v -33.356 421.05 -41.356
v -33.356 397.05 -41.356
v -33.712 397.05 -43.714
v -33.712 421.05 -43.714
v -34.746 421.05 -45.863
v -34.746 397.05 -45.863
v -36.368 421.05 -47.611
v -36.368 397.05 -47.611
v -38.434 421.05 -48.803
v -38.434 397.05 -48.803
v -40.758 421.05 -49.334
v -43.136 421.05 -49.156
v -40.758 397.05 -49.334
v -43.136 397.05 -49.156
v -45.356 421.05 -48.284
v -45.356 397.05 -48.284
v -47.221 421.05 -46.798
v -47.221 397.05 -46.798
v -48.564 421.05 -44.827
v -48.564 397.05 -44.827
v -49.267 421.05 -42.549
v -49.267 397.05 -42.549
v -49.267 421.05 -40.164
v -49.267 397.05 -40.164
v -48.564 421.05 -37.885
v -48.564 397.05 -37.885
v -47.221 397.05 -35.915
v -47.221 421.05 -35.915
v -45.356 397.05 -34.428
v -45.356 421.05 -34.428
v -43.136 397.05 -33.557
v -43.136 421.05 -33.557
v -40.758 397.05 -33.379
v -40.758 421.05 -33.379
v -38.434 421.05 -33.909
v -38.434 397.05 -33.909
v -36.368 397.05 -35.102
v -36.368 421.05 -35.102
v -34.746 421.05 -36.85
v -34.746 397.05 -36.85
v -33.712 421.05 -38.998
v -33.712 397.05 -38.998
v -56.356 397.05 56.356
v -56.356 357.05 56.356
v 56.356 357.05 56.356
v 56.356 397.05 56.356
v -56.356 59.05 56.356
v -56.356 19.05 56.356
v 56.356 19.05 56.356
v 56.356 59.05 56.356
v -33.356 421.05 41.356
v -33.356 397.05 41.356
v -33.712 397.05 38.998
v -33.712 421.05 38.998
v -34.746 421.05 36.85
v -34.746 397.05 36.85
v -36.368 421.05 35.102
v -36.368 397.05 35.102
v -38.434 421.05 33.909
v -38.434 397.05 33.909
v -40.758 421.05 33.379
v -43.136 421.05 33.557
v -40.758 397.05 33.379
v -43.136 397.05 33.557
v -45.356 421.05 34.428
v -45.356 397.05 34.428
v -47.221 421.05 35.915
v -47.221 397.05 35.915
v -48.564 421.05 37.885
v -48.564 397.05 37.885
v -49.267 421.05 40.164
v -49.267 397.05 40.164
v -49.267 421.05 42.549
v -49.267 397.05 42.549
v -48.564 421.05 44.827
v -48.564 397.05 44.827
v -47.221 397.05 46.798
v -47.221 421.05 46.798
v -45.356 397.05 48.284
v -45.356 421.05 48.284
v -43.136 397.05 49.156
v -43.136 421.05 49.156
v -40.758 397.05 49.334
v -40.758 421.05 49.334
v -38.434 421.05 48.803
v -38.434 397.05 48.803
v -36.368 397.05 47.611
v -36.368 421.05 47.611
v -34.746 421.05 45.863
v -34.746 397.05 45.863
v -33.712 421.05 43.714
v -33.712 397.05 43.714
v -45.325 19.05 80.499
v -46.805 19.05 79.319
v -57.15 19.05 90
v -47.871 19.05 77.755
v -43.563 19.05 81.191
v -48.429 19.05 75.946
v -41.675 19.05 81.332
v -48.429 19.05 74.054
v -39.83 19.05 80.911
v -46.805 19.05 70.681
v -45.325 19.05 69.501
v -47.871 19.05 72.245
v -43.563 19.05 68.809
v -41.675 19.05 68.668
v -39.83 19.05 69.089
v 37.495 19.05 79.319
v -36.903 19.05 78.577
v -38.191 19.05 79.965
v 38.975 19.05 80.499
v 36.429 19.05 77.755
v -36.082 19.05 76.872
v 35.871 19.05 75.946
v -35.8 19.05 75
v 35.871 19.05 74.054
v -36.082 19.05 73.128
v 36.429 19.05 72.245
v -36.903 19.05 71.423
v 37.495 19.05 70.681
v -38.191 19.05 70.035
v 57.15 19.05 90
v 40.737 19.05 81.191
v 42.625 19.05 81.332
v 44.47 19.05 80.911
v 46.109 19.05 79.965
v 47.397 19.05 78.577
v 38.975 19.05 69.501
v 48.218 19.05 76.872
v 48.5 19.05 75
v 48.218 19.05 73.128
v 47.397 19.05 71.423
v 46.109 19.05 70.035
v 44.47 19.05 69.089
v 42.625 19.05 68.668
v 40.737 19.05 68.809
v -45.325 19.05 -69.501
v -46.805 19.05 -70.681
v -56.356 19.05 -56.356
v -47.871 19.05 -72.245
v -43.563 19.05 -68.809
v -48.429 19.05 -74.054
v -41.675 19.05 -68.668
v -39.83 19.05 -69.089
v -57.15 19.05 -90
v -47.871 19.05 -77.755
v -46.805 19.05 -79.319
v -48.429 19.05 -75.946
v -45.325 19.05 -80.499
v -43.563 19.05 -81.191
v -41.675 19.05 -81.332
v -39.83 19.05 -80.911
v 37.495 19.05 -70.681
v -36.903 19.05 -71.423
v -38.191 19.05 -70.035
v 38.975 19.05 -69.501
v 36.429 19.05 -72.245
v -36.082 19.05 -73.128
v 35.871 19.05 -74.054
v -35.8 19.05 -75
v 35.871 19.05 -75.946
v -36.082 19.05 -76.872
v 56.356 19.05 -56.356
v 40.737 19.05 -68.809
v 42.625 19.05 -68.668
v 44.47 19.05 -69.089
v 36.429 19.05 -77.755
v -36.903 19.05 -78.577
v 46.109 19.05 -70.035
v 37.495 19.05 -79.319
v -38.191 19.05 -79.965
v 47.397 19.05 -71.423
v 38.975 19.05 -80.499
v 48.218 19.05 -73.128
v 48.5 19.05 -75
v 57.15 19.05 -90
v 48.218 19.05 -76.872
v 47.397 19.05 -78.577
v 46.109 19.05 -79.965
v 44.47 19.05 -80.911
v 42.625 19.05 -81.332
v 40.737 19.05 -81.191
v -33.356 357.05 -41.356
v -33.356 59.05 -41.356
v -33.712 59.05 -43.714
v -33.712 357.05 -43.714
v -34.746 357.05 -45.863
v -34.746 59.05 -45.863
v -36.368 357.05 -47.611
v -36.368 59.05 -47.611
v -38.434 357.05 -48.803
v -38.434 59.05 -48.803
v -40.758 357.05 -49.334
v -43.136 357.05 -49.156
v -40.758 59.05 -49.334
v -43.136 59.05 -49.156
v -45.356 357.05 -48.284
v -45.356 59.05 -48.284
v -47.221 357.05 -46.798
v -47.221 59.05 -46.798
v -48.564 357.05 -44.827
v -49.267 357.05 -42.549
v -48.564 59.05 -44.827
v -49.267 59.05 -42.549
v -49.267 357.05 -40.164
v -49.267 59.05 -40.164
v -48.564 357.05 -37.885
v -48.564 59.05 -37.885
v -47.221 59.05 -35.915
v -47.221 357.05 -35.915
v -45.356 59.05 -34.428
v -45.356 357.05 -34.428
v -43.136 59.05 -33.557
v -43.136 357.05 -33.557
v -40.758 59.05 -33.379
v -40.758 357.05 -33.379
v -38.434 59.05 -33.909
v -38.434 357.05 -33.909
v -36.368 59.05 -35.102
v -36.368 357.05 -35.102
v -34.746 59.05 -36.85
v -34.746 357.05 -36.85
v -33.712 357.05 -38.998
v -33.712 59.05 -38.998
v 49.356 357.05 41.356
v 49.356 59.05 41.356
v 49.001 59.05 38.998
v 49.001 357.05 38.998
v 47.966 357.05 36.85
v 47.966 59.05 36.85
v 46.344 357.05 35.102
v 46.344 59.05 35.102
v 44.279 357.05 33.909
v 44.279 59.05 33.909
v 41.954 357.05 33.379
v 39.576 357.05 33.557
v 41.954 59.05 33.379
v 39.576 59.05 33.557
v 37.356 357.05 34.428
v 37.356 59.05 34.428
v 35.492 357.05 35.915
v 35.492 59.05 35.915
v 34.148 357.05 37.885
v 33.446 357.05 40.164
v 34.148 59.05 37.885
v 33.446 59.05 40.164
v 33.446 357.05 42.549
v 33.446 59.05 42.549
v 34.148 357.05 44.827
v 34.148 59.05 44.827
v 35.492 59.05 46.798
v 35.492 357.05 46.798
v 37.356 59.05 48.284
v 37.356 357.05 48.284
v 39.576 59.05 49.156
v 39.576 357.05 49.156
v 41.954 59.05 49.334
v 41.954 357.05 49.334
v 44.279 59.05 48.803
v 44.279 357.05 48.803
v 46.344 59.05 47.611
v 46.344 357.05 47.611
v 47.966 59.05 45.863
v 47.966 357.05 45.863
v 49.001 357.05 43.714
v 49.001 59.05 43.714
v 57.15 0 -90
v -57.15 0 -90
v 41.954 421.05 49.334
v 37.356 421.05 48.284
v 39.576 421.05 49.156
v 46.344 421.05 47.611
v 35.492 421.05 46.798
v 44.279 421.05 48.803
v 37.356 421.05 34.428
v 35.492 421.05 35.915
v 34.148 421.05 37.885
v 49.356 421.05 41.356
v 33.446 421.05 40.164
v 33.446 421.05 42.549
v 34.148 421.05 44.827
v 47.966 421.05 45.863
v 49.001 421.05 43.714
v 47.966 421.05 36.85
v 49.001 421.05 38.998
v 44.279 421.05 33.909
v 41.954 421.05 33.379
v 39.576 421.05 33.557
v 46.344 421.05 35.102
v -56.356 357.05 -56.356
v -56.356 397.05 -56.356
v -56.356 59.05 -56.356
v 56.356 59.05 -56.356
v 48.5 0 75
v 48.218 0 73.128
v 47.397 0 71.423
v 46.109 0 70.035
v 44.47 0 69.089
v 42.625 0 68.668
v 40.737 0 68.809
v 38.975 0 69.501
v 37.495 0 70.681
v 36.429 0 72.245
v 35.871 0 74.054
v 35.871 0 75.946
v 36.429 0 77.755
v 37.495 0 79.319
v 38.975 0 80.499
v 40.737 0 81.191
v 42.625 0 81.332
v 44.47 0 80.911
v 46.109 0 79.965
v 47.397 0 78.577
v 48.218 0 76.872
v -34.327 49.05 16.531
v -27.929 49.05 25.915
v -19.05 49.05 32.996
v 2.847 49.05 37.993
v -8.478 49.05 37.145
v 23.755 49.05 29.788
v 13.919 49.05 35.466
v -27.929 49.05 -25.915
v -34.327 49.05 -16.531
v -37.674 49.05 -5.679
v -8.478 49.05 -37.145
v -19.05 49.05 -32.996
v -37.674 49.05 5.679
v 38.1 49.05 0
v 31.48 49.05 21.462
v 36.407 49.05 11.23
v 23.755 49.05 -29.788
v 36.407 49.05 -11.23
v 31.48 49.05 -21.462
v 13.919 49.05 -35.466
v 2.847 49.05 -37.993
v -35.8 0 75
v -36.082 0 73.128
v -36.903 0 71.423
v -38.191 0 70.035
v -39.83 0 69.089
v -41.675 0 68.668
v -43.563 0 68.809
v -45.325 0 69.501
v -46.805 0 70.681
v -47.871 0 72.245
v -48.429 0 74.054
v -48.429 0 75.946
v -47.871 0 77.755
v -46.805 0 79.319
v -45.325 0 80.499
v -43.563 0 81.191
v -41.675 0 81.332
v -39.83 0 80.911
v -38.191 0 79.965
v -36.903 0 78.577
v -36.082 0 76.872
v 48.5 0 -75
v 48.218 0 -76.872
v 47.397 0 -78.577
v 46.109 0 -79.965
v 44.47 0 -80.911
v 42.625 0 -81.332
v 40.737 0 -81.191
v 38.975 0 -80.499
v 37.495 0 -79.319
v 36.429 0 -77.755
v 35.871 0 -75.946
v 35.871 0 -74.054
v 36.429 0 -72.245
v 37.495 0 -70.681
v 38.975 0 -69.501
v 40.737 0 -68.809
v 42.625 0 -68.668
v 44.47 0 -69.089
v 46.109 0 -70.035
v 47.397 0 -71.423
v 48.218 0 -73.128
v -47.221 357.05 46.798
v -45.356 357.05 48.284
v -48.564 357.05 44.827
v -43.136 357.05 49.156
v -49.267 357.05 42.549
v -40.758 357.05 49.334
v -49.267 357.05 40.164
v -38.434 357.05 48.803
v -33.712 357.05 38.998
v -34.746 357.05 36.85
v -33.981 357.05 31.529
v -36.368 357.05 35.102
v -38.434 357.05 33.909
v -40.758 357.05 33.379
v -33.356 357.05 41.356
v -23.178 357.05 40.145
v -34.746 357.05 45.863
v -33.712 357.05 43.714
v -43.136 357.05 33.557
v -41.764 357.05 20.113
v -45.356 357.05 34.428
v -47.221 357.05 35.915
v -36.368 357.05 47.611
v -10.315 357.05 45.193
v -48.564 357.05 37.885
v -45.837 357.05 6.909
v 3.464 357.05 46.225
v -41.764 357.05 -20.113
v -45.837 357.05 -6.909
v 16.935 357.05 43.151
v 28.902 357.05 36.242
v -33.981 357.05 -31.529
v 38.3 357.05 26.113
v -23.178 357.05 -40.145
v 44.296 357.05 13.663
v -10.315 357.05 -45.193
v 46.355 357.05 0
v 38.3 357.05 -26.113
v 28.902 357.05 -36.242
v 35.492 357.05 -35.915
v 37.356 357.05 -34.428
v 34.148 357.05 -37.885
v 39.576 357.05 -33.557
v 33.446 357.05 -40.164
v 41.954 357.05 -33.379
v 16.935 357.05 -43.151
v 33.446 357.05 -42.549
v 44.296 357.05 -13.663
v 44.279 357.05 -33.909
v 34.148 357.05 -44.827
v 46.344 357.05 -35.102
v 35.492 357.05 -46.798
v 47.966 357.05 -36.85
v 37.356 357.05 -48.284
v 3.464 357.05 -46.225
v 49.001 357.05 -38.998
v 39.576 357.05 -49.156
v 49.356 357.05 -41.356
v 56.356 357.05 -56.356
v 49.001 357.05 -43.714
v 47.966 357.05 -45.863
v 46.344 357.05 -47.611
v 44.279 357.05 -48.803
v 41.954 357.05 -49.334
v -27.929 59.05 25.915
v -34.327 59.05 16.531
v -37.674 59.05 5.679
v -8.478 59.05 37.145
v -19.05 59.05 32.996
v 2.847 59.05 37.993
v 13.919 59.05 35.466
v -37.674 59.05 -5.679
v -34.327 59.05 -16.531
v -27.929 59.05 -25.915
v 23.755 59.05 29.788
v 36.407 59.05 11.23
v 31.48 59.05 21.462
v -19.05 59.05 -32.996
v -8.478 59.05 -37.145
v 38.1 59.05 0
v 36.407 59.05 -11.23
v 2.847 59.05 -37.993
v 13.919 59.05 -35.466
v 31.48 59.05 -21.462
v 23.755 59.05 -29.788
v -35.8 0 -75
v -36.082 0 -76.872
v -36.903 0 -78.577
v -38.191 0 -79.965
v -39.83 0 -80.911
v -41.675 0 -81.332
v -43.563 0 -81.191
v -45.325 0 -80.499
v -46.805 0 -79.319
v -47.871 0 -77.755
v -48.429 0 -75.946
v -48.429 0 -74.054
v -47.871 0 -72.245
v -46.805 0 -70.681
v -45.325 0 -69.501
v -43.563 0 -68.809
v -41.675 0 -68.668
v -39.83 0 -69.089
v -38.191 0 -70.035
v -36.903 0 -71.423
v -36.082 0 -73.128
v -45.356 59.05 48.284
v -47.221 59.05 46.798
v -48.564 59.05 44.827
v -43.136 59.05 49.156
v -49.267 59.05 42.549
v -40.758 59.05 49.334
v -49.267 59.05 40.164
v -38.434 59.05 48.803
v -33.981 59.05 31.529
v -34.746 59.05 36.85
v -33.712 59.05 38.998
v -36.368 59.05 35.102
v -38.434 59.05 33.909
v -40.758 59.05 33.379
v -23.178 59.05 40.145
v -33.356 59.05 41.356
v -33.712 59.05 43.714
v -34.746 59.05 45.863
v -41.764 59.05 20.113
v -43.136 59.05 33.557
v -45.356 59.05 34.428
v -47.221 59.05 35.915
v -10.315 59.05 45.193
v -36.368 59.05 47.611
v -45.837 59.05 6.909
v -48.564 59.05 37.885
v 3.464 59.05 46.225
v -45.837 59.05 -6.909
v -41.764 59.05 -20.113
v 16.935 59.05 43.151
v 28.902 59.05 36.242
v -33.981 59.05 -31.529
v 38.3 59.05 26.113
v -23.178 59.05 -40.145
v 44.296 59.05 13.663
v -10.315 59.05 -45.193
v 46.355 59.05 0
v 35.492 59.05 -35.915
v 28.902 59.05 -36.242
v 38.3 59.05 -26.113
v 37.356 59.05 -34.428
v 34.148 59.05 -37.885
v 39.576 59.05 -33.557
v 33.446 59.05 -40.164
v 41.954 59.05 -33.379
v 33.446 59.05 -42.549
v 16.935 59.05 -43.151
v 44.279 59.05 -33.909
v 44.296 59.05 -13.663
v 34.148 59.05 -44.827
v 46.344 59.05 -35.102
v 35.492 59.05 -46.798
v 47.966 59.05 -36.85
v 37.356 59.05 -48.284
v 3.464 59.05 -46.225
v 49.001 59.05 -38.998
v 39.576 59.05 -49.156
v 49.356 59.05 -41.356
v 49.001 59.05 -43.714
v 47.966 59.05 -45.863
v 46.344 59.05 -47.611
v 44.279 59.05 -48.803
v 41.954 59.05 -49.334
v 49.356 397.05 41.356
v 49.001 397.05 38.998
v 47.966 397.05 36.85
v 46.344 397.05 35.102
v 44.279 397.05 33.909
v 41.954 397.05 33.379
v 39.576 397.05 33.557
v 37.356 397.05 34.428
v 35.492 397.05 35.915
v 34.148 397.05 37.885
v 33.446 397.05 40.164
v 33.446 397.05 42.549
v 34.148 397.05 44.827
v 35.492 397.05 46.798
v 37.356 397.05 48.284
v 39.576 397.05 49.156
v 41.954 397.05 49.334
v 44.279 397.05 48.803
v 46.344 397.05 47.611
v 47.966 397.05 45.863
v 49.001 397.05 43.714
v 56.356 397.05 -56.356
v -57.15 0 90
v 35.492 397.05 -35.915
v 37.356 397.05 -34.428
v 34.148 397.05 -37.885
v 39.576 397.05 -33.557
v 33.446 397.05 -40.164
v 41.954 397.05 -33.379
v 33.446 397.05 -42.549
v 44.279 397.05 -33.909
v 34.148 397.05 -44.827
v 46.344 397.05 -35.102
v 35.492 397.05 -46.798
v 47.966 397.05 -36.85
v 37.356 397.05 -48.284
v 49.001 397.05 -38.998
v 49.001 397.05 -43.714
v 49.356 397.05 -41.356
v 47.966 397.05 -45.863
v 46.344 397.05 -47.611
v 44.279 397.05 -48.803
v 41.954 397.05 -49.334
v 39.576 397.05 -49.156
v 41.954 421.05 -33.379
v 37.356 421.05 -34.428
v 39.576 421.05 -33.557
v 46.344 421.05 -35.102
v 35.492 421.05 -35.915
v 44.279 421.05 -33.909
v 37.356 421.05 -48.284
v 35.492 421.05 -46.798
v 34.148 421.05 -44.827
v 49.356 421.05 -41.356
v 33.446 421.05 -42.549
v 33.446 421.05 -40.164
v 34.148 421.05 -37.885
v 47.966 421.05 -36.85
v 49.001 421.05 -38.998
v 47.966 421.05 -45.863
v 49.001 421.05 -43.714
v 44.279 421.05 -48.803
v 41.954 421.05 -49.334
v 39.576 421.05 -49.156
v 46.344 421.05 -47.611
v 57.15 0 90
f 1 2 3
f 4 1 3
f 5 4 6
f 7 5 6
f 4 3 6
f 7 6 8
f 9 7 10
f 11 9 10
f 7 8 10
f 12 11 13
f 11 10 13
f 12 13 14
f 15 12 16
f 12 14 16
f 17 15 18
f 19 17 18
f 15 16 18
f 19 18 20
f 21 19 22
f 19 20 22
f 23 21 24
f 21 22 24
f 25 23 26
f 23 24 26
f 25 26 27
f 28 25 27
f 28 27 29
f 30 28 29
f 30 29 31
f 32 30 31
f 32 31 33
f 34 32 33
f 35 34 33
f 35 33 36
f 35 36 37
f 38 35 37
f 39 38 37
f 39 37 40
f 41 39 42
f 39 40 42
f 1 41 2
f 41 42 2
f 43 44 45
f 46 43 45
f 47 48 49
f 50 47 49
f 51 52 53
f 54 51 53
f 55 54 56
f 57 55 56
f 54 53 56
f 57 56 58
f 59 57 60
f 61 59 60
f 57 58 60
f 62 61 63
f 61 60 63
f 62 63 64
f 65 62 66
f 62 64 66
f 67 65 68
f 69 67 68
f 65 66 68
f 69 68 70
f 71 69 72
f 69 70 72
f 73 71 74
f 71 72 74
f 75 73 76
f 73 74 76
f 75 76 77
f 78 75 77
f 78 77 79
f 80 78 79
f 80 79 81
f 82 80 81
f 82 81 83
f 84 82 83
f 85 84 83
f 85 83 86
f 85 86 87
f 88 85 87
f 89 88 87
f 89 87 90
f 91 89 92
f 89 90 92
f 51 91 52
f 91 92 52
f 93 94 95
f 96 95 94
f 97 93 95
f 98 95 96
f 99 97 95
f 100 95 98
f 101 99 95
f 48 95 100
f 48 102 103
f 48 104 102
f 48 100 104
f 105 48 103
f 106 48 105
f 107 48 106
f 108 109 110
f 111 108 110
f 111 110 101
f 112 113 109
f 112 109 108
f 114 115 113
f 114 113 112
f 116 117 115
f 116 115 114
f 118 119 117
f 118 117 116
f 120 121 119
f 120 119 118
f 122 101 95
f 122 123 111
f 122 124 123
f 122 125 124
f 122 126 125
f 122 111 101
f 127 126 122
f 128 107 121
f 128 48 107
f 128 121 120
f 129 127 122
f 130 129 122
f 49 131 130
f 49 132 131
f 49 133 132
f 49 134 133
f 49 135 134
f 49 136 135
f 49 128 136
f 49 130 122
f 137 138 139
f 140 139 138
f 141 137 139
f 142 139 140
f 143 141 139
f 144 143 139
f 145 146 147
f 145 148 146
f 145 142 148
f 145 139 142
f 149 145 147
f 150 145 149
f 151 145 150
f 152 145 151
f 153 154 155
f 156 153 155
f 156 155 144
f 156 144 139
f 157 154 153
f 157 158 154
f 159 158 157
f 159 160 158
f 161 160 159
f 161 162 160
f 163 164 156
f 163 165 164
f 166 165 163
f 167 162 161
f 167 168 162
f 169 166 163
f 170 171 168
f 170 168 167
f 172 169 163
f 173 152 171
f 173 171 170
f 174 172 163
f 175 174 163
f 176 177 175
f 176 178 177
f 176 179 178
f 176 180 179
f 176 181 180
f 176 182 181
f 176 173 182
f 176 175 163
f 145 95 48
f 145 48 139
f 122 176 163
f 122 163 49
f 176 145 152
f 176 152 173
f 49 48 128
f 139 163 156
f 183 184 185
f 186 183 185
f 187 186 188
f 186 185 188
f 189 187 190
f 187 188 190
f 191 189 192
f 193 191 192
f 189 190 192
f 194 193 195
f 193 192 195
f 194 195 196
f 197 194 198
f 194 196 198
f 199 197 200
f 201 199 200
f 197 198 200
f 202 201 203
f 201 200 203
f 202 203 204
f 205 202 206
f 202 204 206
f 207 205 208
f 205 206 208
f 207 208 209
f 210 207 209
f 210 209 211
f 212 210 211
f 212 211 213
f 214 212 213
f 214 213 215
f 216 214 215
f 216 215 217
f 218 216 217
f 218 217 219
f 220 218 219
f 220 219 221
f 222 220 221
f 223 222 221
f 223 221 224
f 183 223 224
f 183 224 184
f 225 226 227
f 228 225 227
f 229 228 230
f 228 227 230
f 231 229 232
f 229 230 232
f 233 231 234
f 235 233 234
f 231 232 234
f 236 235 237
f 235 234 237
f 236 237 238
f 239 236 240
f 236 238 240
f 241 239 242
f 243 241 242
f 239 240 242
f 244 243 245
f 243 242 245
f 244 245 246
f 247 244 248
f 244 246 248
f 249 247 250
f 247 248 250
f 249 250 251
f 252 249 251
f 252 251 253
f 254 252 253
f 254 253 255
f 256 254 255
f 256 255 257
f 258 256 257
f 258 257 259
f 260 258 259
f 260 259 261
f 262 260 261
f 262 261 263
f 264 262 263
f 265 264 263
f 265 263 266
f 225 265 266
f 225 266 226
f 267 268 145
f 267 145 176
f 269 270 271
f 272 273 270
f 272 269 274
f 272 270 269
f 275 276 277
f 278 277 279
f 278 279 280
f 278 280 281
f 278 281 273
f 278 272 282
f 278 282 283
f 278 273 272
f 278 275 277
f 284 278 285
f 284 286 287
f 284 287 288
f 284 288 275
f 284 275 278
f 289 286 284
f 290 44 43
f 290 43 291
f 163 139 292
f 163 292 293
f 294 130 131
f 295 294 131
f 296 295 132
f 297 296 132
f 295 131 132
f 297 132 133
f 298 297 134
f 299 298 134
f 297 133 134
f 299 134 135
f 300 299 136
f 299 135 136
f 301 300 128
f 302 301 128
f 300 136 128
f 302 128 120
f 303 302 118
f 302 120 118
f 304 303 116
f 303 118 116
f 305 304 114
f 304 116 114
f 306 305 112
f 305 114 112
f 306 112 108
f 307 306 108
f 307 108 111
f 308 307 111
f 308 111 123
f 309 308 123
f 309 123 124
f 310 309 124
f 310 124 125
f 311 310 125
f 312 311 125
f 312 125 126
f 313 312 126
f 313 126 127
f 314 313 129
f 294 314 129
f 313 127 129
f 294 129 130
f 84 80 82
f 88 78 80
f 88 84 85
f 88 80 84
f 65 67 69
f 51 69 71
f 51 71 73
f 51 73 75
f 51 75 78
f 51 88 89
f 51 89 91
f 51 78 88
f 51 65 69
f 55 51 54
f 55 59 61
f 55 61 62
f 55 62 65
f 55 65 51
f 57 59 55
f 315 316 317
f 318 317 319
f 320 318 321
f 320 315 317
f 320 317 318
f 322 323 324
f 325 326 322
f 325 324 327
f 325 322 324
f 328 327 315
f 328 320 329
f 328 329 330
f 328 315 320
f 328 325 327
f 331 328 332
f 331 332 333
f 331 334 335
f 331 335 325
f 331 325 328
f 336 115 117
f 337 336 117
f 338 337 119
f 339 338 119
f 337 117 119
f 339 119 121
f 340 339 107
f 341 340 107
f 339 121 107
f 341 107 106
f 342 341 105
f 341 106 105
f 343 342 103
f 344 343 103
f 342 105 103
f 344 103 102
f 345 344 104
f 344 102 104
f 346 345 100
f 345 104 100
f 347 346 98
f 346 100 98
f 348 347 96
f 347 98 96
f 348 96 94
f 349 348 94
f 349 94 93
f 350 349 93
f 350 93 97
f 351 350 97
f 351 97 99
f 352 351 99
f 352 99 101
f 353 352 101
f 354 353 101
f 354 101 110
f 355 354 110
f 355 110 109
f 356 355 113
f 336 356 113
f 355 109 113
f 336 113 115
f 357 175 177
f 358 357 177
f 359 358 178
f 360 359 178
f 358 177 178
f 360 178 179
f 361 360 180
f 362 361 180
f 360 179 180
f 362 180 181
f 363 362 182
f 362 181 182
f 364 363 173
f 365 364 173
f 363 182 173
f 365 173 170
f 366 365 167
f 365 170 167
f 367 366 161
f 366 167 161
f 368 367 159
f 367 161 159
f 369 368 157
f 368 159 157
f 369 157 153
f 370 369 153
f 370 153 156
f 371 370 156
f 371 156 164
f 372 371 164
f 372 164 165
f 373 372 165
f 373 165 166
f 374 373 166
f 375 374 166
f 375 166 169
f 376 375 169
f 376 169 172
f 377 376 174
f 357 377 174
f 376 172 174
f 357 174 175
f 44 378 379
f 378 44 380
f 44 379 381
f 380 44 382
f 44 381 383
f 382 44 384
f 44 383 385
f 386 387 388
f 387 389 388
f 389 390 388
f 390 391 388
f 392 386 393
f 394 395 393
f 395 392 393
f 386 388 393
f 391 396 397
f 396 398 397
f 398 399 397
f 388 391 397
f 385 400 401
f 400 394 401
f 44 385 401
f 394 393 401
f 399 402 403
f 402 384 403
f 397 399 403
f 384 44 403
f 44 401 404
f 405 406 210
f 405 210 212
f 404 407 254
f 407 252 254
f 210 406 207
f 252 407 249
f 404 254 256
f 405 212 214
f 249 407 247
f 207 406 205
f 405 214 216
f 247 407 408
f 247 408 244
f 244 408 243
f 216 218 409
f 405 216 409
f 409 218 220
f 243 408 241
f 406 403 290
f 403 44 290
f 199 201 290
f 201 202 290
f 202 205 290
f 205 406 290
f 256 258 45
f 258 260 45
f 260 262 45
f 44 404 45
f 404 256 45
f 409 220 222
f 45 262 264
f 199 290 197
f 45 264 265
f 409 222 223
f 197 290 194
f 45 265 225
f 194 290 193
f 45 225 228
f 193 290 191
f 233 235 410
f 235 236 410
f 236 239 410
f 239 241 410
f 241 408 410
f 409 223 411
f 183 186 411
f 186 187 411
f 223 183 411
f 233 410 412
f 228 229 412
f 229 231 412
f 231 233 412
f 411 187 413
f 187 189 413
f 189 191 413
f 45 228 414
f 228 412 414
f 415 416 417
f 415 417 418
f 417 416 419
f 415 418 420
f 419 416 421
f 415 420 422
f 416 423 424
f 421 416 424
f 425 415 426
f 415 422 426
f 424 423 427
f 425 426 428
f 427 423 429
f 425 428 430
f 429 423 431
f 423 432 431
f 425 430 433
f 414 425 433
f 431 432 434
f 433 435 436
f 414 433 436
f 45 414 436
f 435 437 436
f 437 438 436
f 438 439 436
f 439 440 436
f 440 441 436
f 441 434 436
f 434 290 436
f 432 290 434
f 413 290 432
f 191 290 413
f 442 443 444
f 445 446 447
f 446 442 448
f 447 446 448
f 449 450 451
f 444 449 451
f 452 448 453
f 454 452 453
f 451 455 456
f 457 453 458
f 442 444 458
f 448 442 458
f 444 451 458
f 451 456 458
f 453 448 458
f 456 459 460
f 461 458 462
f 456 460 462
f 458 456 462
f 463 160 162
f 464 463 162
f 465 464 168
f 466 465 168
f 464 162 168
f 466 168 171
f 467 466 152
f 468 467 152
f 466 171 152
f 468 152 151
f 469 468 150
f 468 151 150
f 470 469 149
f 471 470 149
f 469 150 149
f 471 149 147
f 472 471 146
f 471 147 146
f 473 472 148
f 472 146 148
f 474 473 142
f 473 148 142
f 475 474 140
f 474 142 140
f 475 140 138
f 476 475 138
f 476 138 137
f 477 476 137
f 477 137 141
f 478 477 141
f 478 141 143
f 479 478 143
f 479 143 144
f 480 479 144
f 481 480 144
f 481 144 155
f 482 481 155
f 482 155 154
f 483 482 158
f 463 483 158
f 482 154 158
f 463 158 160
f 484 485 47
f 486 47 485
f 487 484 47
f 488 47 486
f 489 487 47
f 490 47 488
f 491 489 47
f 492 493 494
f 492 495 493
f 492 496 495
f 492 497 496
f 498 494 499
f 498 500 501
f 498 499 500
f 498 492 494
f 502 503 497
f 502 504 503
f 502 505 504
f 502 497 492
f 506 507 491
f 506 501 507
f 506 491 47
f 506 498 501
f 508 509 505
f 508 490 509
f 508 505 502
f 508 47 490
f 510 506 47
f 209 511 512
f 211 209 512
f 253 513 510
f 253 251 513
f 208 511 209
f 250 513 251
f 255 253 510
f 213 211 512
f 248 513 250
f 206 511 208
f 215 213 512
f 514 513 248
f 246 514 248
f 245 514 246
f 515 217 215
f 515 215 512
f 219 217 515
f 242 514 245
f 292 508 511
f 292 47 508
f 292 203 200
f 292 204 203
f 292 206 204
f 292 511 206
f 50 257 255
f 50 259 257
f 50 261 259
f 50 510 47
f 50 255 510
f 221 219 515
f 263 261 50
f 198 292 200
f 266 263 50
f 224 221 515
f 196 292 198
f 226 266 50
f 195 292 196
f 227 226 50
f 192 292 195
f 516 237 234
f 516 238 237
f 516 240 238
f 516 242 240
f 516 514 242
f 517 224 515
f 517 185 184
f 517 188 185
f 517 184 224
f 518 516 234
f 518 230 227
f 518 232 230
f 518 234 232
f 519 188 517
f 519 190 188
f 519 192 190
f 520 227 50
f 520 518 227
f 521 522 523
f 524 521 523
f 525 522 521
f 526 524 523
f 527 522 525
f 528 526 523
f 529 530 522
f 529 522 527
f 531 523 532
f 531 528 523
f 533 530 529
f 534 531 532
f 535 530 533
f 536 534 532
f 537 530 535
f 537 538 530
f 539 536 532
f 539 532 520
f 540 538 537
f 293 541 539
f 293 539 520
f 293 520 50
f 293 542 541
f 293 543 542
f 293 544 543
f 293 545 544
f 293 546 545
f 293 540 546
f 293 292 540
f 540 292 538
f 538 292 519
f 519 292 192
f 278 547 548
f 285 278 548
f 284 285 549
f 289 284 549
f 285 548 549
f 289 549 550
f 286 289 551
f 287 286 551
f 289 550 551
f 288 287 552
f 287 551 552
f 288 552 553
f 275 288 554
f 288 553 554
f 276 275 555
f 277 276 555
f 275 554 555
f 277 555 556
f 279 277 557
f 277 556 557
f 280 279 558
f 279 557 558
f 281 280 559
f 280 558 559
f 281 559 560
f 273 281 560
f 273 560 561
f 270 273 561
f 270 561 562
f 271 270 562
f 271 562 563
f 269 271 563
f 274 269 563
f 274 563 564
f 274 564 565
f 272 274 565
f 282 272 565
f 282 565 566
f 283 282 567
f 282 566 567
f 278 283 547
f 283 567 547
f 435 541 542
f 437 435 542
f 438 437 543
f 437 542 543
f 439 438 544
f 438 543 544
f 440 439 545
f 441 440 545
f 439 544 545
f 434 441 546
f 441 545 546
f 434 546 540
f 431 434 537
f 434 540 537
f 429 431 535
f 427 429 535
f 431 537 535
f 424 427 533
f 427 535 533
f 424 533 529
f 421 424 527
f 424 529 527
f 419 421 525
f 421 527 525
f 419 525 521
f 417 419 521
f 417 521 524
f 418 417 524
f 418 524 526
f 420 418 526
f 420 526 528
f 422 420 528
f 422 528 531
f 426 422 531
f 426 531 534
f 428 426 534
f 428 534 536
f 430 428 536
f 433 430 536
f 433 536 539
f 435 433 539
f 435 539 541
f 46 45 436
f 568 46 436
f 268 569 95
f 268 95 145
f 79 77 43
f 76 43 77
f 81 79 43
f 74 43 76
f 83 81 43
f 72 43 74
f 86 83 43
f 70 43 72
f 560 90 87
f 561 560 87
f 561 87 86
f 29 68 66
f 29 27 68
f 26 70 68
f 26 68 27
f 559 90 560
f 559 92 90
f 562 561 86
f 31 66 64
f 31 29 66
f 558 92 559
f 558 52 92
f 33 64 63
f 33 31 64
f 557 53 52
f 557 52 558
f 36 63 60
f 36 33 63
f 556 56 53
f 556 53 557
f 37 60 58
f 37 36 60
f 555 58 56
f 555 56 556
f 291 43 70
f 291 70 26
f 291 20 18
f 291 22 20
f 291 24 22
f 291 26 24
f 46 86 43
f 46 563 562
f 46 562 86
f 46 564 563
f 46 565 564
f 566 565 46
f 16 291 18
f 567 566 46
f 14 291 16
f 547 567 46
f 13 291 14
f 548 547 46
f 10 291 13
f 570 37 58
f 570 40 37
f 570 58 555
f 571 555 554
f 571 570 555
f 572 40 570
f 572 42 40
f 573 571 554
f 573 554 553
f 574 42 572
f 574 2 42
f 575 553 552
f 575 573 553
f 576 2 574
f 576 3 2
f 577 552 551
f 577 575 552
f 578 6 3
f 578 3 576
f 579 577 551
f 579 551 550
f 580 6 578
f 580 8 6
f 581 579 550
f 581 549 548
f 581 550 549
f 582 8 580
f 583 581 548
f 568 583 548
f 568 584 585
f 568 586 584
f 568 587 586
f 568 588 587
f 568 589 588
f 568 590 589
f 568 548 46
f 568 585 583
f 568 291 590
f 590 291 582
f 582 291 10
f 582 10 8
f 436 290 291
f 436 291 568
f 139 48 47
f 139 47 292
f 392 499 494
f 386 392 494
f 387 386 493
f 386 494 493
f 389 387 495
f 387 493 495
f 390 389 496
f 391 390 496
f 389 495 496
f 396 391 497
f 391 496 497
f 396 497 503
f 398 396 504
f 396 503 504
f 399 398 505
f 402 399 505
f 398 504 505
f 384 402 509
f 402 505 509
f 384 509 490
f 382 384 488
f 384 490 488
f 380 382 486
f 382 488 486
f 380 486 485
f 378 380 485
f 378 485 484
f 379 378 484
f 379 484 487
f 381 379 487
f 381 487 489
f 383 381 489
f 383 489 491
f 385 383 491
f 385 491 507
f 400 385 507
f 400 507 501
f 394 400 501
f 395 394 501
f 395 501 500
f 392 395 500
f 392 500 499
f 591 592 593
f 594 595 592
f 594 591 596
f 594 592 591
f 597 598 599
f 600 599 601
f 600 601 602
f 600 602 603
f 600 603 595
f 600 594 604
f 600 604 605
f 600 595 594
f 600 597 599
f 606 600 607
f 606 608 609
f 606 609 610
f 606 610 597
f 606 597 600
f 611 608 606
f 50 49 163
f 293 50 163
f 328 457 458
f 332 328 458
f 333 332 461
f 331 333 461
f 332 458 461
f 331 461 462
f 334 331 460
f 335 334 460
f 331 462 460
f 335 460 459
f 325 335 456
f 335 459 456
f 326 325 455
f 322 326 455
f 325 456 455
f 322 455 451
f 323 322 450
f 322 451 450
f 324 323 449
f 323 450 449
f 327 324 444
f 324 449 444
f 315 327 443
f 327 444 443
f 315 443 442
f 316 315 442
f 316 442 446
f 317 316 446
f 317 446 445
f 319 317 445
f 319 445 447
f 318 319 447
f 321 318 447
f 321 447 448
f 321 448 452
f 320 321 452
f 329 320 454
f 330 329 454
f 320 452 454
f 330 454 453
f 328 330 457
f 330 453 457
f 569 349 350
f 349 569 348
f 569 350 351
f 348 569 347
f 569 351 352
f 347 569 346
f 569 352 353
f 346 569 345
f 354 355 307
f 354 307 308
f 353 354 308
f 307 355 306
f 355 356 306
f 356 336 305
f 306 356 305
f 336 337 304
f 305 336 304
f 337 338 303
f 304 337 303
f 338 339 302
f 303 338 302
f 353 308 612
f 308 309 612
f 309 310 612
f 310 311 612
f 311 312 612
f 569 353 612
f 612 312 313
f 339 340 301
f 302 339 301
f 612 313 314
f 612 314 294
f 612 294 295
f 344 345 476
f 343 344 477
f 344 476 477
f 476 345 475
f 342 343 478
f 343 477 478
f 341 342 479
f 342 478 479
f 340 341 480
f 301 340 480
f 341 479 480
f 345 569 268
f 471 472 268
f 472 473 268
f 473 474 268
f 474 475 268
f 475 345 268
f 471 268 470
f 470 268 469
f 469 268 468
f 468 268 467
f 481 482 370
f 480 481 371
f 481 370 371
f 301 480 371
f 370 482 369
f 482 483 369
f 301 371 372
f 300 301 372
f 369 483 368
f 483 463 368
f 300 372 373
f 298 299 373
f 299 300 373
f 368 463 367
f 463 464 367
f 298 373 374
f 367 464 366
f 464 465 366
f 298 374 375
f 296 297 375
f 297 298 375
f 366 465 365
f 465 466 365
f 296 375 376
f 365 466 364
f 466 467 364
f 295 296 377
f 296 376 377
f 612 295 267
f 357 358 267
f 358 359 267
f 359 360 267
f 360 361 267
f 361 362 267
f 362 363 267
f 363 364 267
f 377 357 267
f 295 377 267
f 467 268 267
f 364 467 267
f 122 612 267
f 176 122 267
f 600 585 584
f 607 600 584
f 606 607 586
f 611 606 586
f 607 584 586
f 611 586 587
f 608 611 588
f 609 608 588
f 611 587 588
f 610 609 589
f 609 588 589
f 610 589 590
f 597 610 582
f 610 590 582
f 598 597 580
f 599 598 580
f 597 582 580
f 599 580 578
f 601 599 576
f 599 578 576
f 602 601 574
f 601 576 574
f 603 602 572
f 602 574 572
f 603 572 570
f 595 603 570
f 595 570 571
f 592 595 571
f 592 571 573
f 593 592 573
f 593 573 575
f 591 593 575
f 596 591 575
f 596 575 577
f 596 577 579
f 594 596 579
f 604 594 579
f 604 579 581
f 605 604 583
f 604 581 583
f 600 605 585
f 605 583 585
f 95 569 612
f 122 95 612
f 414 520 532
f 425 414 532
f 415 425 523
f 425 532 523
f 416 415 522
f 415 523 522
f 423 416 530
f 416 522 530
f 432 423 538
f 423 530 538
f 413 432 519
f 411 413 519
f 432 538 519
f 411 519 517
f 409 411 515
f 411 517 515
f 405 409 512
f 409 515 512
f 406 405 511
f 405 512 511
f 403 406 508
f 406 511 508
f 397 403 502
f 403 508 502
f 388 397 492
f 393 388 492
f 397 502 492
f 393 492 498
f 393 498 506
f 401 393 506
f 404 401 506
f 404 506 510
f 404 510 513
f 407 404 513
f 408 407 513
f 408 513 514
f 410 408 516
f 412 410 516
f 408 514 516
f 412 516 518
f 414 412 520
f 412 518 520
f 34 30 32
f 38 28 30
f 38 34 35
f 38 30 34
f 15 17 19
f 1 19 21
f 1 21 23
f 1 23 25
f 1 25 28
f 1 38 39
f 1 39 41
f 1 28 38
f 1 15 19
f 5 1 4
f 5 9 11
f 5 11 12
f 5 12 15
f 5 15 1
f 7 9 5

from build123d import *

# Parameters (mm, degrees)
CROQUIS1_W              = 114.3
CROQUIS1_H              = 180
SALIENTE_EXTRUIR1_DEPTH = 19.05
CROQUIS2_R              = 6.35
CORTAR_EXTRUIR1_DEPTH   = 19.05
CROQUIS3_W              = 112.7125
CROQUIS3_H              = 112.7125
SALIENTE_EXTRUIR2_DEPTH = 40
CROQUIS4_R              = 8
CORTAR_EXTRUIR2_DEPTH   = 40
CROQUIS5_R              = 8
SALIENTE_EXTRUIR3_DEPTH = 338
CROQUIS6_R              = 38.1
CORTAR_EXTRUIR3_DEPTH   = 10
CROQUIS7_R              = 46.355
SALIENTE_EXTRUIR4_DEPTH = 298
CROQUIS8_W              = 112.7125
CROQUIS8_H              = 112.7125
SALIENTE_EXTRUIR5_DEPTH = 40
CROQUIS9_R              = 8
SALIENTE_EXTRUIR6_DEPTH = 24


with BuildPart() as part:
    # Croquis1 → Saliente-Extruir1 (new body)
    with BuildSketch(Plane(origin=(0, 0, 0), x_dir=(1, 0, 0), z_dir=(0, 1, 0))):
        Rectangle(CROQUIS1_W, CROQUIS1_H)
    extrude(amount=SALIENTE_EXTRUIR1_DEPTH)

    # Croquis2 → Cortar-Extruir1 (cut)
    with BuildSketch(Plane(origin=(0, 19.05, 0), x_dir=(1, 0, 0), z_dir=(0, 1, 0))):
        with Locations((-42.15, 75)):
            Circle(CROQUIS2_R)
        with Locations((42.15, 75)):
            Circle(CROQUIS2_R)
        with Locations((42.15, -75)):
            Circle(CROQUIS2_R)
        with Locations((-42.15, -75)):
            Circle(CROQUIS2_R)
    extrude(amount=-CORTAR_EXTRUIR1_DEPTH, mode=Mode.SUBTRACT)

    # Croquis3 → Saliente-Extruir2 (add)
    with BuildSketch(Plane(origin=(0, 19.05, 0), x_dir=(1, 0, 0), z_dir=(0, 1, 0))):
        Rectangle(CROQUIS3_W, CROQUIS3_H)
    extrude(amount=SALIENTE_EXTRUIR2_DEPTH)

    # Croquis4 → Cortar-Extruir2 (cut)
    with BuildSketch(Plane(origin=(0, 59.05, 0), x_dir=(1, 0, 0), z_dir=(0, 1, 0))):
        with Locations((-41.35625, 41.35625)):
            Circle(CROQUIS4_R)
        with Locations((41.35625, 41.35625)):
            Circle(CROQUIS4_R)
        with Locations((41.35625, -41.35625)):
            Circle(CROQUIS4_R)
        with Locations((-41.35625, -41.35625)):
            Circle(CROQUIS4_R)
    extrude(amount=-CORTAR_EXTRUIR2_DEPTH, mode=Mode.SUBTRACT)

    # Croquis5 → Saliente-Extruir3 (add)
    with BuildSketch(Plane(origin=(0, 19.05, 0), x_dir=(1, 0, 0), z_dir=(0, 1, 0))):
        with Locations((-41.35625, 41.35625)):
            Circle(CROQUIS5_R)
        with Locations((41.35625, 41.35625)):
            Circle(CROQUIS5_R)
        with Locations((41.35625, -41.35625)):
            Circle(CROQUIS5_R)
        with Locations((-41.35625, -41.35625)):
            Circle(CROQUIS5_R)
    extrude(amount=SALIENTE_EXTRUIR3_DEPTH)

    # Croquis6 → Cortar-Extruir3 (cut)
    with BuildSketch(Plane(origin=(0, 59.05, 0), x_dir=(1, 0, 0), z_dir=(0, 1, 0))):
        Circle(CROQUIS6_R)
    extrude(amount=-CORTAR_EXTRUIR3_DEPTH, mode=Mode.SUBTRACT)

    # Croquis7 → Saliente-Extruir4 (add)
    with BuildSketch(Plane(origin=(0, 59.05, 0), x_dir=(1, 0, 0), z_dir=(0, 1, 0))):
        Circle(CROQUIS7_R)
    extrude(amount=SALIENTE_EXTRUIR4_DEPTH)

    # Croquis8 → Saliente-Extruir5 (add)
    with BuildSketch(Plane(origin=(0, 357.05, 0), x_dir=(1, 0, 0), z_dir=(0, 1, 0))):
        Rectangle(CROQUIS8_W, CROQUIS8_H)
    extrude(amount=SALIENTE_EXTRUIR5_DEPTH)

    # Croquis9 → Saliente-Extruir6 (add)
    with BuildSketch(Plane(origin=(0, 397.05, 0), x_dir=(1, 0, 0), z_dir=(0, 1, 0))):
        with Locations((-41.35625, 41.35625)):
            Circle(CROQUIS9_R)
        with Locations((41.35625, 41.35625)):
            Circle(CROQUIS9_R)
        with Locations((-41.35625, -41.35625)):
            Circle(CROQUIS9_R)
        with Locations((41.35625, -41.35625)):
            Circle(CROQUIS9_R)
    extrude(amount=SALIENTE_EXTRUIR6_DEPTH)


solid = part.part
